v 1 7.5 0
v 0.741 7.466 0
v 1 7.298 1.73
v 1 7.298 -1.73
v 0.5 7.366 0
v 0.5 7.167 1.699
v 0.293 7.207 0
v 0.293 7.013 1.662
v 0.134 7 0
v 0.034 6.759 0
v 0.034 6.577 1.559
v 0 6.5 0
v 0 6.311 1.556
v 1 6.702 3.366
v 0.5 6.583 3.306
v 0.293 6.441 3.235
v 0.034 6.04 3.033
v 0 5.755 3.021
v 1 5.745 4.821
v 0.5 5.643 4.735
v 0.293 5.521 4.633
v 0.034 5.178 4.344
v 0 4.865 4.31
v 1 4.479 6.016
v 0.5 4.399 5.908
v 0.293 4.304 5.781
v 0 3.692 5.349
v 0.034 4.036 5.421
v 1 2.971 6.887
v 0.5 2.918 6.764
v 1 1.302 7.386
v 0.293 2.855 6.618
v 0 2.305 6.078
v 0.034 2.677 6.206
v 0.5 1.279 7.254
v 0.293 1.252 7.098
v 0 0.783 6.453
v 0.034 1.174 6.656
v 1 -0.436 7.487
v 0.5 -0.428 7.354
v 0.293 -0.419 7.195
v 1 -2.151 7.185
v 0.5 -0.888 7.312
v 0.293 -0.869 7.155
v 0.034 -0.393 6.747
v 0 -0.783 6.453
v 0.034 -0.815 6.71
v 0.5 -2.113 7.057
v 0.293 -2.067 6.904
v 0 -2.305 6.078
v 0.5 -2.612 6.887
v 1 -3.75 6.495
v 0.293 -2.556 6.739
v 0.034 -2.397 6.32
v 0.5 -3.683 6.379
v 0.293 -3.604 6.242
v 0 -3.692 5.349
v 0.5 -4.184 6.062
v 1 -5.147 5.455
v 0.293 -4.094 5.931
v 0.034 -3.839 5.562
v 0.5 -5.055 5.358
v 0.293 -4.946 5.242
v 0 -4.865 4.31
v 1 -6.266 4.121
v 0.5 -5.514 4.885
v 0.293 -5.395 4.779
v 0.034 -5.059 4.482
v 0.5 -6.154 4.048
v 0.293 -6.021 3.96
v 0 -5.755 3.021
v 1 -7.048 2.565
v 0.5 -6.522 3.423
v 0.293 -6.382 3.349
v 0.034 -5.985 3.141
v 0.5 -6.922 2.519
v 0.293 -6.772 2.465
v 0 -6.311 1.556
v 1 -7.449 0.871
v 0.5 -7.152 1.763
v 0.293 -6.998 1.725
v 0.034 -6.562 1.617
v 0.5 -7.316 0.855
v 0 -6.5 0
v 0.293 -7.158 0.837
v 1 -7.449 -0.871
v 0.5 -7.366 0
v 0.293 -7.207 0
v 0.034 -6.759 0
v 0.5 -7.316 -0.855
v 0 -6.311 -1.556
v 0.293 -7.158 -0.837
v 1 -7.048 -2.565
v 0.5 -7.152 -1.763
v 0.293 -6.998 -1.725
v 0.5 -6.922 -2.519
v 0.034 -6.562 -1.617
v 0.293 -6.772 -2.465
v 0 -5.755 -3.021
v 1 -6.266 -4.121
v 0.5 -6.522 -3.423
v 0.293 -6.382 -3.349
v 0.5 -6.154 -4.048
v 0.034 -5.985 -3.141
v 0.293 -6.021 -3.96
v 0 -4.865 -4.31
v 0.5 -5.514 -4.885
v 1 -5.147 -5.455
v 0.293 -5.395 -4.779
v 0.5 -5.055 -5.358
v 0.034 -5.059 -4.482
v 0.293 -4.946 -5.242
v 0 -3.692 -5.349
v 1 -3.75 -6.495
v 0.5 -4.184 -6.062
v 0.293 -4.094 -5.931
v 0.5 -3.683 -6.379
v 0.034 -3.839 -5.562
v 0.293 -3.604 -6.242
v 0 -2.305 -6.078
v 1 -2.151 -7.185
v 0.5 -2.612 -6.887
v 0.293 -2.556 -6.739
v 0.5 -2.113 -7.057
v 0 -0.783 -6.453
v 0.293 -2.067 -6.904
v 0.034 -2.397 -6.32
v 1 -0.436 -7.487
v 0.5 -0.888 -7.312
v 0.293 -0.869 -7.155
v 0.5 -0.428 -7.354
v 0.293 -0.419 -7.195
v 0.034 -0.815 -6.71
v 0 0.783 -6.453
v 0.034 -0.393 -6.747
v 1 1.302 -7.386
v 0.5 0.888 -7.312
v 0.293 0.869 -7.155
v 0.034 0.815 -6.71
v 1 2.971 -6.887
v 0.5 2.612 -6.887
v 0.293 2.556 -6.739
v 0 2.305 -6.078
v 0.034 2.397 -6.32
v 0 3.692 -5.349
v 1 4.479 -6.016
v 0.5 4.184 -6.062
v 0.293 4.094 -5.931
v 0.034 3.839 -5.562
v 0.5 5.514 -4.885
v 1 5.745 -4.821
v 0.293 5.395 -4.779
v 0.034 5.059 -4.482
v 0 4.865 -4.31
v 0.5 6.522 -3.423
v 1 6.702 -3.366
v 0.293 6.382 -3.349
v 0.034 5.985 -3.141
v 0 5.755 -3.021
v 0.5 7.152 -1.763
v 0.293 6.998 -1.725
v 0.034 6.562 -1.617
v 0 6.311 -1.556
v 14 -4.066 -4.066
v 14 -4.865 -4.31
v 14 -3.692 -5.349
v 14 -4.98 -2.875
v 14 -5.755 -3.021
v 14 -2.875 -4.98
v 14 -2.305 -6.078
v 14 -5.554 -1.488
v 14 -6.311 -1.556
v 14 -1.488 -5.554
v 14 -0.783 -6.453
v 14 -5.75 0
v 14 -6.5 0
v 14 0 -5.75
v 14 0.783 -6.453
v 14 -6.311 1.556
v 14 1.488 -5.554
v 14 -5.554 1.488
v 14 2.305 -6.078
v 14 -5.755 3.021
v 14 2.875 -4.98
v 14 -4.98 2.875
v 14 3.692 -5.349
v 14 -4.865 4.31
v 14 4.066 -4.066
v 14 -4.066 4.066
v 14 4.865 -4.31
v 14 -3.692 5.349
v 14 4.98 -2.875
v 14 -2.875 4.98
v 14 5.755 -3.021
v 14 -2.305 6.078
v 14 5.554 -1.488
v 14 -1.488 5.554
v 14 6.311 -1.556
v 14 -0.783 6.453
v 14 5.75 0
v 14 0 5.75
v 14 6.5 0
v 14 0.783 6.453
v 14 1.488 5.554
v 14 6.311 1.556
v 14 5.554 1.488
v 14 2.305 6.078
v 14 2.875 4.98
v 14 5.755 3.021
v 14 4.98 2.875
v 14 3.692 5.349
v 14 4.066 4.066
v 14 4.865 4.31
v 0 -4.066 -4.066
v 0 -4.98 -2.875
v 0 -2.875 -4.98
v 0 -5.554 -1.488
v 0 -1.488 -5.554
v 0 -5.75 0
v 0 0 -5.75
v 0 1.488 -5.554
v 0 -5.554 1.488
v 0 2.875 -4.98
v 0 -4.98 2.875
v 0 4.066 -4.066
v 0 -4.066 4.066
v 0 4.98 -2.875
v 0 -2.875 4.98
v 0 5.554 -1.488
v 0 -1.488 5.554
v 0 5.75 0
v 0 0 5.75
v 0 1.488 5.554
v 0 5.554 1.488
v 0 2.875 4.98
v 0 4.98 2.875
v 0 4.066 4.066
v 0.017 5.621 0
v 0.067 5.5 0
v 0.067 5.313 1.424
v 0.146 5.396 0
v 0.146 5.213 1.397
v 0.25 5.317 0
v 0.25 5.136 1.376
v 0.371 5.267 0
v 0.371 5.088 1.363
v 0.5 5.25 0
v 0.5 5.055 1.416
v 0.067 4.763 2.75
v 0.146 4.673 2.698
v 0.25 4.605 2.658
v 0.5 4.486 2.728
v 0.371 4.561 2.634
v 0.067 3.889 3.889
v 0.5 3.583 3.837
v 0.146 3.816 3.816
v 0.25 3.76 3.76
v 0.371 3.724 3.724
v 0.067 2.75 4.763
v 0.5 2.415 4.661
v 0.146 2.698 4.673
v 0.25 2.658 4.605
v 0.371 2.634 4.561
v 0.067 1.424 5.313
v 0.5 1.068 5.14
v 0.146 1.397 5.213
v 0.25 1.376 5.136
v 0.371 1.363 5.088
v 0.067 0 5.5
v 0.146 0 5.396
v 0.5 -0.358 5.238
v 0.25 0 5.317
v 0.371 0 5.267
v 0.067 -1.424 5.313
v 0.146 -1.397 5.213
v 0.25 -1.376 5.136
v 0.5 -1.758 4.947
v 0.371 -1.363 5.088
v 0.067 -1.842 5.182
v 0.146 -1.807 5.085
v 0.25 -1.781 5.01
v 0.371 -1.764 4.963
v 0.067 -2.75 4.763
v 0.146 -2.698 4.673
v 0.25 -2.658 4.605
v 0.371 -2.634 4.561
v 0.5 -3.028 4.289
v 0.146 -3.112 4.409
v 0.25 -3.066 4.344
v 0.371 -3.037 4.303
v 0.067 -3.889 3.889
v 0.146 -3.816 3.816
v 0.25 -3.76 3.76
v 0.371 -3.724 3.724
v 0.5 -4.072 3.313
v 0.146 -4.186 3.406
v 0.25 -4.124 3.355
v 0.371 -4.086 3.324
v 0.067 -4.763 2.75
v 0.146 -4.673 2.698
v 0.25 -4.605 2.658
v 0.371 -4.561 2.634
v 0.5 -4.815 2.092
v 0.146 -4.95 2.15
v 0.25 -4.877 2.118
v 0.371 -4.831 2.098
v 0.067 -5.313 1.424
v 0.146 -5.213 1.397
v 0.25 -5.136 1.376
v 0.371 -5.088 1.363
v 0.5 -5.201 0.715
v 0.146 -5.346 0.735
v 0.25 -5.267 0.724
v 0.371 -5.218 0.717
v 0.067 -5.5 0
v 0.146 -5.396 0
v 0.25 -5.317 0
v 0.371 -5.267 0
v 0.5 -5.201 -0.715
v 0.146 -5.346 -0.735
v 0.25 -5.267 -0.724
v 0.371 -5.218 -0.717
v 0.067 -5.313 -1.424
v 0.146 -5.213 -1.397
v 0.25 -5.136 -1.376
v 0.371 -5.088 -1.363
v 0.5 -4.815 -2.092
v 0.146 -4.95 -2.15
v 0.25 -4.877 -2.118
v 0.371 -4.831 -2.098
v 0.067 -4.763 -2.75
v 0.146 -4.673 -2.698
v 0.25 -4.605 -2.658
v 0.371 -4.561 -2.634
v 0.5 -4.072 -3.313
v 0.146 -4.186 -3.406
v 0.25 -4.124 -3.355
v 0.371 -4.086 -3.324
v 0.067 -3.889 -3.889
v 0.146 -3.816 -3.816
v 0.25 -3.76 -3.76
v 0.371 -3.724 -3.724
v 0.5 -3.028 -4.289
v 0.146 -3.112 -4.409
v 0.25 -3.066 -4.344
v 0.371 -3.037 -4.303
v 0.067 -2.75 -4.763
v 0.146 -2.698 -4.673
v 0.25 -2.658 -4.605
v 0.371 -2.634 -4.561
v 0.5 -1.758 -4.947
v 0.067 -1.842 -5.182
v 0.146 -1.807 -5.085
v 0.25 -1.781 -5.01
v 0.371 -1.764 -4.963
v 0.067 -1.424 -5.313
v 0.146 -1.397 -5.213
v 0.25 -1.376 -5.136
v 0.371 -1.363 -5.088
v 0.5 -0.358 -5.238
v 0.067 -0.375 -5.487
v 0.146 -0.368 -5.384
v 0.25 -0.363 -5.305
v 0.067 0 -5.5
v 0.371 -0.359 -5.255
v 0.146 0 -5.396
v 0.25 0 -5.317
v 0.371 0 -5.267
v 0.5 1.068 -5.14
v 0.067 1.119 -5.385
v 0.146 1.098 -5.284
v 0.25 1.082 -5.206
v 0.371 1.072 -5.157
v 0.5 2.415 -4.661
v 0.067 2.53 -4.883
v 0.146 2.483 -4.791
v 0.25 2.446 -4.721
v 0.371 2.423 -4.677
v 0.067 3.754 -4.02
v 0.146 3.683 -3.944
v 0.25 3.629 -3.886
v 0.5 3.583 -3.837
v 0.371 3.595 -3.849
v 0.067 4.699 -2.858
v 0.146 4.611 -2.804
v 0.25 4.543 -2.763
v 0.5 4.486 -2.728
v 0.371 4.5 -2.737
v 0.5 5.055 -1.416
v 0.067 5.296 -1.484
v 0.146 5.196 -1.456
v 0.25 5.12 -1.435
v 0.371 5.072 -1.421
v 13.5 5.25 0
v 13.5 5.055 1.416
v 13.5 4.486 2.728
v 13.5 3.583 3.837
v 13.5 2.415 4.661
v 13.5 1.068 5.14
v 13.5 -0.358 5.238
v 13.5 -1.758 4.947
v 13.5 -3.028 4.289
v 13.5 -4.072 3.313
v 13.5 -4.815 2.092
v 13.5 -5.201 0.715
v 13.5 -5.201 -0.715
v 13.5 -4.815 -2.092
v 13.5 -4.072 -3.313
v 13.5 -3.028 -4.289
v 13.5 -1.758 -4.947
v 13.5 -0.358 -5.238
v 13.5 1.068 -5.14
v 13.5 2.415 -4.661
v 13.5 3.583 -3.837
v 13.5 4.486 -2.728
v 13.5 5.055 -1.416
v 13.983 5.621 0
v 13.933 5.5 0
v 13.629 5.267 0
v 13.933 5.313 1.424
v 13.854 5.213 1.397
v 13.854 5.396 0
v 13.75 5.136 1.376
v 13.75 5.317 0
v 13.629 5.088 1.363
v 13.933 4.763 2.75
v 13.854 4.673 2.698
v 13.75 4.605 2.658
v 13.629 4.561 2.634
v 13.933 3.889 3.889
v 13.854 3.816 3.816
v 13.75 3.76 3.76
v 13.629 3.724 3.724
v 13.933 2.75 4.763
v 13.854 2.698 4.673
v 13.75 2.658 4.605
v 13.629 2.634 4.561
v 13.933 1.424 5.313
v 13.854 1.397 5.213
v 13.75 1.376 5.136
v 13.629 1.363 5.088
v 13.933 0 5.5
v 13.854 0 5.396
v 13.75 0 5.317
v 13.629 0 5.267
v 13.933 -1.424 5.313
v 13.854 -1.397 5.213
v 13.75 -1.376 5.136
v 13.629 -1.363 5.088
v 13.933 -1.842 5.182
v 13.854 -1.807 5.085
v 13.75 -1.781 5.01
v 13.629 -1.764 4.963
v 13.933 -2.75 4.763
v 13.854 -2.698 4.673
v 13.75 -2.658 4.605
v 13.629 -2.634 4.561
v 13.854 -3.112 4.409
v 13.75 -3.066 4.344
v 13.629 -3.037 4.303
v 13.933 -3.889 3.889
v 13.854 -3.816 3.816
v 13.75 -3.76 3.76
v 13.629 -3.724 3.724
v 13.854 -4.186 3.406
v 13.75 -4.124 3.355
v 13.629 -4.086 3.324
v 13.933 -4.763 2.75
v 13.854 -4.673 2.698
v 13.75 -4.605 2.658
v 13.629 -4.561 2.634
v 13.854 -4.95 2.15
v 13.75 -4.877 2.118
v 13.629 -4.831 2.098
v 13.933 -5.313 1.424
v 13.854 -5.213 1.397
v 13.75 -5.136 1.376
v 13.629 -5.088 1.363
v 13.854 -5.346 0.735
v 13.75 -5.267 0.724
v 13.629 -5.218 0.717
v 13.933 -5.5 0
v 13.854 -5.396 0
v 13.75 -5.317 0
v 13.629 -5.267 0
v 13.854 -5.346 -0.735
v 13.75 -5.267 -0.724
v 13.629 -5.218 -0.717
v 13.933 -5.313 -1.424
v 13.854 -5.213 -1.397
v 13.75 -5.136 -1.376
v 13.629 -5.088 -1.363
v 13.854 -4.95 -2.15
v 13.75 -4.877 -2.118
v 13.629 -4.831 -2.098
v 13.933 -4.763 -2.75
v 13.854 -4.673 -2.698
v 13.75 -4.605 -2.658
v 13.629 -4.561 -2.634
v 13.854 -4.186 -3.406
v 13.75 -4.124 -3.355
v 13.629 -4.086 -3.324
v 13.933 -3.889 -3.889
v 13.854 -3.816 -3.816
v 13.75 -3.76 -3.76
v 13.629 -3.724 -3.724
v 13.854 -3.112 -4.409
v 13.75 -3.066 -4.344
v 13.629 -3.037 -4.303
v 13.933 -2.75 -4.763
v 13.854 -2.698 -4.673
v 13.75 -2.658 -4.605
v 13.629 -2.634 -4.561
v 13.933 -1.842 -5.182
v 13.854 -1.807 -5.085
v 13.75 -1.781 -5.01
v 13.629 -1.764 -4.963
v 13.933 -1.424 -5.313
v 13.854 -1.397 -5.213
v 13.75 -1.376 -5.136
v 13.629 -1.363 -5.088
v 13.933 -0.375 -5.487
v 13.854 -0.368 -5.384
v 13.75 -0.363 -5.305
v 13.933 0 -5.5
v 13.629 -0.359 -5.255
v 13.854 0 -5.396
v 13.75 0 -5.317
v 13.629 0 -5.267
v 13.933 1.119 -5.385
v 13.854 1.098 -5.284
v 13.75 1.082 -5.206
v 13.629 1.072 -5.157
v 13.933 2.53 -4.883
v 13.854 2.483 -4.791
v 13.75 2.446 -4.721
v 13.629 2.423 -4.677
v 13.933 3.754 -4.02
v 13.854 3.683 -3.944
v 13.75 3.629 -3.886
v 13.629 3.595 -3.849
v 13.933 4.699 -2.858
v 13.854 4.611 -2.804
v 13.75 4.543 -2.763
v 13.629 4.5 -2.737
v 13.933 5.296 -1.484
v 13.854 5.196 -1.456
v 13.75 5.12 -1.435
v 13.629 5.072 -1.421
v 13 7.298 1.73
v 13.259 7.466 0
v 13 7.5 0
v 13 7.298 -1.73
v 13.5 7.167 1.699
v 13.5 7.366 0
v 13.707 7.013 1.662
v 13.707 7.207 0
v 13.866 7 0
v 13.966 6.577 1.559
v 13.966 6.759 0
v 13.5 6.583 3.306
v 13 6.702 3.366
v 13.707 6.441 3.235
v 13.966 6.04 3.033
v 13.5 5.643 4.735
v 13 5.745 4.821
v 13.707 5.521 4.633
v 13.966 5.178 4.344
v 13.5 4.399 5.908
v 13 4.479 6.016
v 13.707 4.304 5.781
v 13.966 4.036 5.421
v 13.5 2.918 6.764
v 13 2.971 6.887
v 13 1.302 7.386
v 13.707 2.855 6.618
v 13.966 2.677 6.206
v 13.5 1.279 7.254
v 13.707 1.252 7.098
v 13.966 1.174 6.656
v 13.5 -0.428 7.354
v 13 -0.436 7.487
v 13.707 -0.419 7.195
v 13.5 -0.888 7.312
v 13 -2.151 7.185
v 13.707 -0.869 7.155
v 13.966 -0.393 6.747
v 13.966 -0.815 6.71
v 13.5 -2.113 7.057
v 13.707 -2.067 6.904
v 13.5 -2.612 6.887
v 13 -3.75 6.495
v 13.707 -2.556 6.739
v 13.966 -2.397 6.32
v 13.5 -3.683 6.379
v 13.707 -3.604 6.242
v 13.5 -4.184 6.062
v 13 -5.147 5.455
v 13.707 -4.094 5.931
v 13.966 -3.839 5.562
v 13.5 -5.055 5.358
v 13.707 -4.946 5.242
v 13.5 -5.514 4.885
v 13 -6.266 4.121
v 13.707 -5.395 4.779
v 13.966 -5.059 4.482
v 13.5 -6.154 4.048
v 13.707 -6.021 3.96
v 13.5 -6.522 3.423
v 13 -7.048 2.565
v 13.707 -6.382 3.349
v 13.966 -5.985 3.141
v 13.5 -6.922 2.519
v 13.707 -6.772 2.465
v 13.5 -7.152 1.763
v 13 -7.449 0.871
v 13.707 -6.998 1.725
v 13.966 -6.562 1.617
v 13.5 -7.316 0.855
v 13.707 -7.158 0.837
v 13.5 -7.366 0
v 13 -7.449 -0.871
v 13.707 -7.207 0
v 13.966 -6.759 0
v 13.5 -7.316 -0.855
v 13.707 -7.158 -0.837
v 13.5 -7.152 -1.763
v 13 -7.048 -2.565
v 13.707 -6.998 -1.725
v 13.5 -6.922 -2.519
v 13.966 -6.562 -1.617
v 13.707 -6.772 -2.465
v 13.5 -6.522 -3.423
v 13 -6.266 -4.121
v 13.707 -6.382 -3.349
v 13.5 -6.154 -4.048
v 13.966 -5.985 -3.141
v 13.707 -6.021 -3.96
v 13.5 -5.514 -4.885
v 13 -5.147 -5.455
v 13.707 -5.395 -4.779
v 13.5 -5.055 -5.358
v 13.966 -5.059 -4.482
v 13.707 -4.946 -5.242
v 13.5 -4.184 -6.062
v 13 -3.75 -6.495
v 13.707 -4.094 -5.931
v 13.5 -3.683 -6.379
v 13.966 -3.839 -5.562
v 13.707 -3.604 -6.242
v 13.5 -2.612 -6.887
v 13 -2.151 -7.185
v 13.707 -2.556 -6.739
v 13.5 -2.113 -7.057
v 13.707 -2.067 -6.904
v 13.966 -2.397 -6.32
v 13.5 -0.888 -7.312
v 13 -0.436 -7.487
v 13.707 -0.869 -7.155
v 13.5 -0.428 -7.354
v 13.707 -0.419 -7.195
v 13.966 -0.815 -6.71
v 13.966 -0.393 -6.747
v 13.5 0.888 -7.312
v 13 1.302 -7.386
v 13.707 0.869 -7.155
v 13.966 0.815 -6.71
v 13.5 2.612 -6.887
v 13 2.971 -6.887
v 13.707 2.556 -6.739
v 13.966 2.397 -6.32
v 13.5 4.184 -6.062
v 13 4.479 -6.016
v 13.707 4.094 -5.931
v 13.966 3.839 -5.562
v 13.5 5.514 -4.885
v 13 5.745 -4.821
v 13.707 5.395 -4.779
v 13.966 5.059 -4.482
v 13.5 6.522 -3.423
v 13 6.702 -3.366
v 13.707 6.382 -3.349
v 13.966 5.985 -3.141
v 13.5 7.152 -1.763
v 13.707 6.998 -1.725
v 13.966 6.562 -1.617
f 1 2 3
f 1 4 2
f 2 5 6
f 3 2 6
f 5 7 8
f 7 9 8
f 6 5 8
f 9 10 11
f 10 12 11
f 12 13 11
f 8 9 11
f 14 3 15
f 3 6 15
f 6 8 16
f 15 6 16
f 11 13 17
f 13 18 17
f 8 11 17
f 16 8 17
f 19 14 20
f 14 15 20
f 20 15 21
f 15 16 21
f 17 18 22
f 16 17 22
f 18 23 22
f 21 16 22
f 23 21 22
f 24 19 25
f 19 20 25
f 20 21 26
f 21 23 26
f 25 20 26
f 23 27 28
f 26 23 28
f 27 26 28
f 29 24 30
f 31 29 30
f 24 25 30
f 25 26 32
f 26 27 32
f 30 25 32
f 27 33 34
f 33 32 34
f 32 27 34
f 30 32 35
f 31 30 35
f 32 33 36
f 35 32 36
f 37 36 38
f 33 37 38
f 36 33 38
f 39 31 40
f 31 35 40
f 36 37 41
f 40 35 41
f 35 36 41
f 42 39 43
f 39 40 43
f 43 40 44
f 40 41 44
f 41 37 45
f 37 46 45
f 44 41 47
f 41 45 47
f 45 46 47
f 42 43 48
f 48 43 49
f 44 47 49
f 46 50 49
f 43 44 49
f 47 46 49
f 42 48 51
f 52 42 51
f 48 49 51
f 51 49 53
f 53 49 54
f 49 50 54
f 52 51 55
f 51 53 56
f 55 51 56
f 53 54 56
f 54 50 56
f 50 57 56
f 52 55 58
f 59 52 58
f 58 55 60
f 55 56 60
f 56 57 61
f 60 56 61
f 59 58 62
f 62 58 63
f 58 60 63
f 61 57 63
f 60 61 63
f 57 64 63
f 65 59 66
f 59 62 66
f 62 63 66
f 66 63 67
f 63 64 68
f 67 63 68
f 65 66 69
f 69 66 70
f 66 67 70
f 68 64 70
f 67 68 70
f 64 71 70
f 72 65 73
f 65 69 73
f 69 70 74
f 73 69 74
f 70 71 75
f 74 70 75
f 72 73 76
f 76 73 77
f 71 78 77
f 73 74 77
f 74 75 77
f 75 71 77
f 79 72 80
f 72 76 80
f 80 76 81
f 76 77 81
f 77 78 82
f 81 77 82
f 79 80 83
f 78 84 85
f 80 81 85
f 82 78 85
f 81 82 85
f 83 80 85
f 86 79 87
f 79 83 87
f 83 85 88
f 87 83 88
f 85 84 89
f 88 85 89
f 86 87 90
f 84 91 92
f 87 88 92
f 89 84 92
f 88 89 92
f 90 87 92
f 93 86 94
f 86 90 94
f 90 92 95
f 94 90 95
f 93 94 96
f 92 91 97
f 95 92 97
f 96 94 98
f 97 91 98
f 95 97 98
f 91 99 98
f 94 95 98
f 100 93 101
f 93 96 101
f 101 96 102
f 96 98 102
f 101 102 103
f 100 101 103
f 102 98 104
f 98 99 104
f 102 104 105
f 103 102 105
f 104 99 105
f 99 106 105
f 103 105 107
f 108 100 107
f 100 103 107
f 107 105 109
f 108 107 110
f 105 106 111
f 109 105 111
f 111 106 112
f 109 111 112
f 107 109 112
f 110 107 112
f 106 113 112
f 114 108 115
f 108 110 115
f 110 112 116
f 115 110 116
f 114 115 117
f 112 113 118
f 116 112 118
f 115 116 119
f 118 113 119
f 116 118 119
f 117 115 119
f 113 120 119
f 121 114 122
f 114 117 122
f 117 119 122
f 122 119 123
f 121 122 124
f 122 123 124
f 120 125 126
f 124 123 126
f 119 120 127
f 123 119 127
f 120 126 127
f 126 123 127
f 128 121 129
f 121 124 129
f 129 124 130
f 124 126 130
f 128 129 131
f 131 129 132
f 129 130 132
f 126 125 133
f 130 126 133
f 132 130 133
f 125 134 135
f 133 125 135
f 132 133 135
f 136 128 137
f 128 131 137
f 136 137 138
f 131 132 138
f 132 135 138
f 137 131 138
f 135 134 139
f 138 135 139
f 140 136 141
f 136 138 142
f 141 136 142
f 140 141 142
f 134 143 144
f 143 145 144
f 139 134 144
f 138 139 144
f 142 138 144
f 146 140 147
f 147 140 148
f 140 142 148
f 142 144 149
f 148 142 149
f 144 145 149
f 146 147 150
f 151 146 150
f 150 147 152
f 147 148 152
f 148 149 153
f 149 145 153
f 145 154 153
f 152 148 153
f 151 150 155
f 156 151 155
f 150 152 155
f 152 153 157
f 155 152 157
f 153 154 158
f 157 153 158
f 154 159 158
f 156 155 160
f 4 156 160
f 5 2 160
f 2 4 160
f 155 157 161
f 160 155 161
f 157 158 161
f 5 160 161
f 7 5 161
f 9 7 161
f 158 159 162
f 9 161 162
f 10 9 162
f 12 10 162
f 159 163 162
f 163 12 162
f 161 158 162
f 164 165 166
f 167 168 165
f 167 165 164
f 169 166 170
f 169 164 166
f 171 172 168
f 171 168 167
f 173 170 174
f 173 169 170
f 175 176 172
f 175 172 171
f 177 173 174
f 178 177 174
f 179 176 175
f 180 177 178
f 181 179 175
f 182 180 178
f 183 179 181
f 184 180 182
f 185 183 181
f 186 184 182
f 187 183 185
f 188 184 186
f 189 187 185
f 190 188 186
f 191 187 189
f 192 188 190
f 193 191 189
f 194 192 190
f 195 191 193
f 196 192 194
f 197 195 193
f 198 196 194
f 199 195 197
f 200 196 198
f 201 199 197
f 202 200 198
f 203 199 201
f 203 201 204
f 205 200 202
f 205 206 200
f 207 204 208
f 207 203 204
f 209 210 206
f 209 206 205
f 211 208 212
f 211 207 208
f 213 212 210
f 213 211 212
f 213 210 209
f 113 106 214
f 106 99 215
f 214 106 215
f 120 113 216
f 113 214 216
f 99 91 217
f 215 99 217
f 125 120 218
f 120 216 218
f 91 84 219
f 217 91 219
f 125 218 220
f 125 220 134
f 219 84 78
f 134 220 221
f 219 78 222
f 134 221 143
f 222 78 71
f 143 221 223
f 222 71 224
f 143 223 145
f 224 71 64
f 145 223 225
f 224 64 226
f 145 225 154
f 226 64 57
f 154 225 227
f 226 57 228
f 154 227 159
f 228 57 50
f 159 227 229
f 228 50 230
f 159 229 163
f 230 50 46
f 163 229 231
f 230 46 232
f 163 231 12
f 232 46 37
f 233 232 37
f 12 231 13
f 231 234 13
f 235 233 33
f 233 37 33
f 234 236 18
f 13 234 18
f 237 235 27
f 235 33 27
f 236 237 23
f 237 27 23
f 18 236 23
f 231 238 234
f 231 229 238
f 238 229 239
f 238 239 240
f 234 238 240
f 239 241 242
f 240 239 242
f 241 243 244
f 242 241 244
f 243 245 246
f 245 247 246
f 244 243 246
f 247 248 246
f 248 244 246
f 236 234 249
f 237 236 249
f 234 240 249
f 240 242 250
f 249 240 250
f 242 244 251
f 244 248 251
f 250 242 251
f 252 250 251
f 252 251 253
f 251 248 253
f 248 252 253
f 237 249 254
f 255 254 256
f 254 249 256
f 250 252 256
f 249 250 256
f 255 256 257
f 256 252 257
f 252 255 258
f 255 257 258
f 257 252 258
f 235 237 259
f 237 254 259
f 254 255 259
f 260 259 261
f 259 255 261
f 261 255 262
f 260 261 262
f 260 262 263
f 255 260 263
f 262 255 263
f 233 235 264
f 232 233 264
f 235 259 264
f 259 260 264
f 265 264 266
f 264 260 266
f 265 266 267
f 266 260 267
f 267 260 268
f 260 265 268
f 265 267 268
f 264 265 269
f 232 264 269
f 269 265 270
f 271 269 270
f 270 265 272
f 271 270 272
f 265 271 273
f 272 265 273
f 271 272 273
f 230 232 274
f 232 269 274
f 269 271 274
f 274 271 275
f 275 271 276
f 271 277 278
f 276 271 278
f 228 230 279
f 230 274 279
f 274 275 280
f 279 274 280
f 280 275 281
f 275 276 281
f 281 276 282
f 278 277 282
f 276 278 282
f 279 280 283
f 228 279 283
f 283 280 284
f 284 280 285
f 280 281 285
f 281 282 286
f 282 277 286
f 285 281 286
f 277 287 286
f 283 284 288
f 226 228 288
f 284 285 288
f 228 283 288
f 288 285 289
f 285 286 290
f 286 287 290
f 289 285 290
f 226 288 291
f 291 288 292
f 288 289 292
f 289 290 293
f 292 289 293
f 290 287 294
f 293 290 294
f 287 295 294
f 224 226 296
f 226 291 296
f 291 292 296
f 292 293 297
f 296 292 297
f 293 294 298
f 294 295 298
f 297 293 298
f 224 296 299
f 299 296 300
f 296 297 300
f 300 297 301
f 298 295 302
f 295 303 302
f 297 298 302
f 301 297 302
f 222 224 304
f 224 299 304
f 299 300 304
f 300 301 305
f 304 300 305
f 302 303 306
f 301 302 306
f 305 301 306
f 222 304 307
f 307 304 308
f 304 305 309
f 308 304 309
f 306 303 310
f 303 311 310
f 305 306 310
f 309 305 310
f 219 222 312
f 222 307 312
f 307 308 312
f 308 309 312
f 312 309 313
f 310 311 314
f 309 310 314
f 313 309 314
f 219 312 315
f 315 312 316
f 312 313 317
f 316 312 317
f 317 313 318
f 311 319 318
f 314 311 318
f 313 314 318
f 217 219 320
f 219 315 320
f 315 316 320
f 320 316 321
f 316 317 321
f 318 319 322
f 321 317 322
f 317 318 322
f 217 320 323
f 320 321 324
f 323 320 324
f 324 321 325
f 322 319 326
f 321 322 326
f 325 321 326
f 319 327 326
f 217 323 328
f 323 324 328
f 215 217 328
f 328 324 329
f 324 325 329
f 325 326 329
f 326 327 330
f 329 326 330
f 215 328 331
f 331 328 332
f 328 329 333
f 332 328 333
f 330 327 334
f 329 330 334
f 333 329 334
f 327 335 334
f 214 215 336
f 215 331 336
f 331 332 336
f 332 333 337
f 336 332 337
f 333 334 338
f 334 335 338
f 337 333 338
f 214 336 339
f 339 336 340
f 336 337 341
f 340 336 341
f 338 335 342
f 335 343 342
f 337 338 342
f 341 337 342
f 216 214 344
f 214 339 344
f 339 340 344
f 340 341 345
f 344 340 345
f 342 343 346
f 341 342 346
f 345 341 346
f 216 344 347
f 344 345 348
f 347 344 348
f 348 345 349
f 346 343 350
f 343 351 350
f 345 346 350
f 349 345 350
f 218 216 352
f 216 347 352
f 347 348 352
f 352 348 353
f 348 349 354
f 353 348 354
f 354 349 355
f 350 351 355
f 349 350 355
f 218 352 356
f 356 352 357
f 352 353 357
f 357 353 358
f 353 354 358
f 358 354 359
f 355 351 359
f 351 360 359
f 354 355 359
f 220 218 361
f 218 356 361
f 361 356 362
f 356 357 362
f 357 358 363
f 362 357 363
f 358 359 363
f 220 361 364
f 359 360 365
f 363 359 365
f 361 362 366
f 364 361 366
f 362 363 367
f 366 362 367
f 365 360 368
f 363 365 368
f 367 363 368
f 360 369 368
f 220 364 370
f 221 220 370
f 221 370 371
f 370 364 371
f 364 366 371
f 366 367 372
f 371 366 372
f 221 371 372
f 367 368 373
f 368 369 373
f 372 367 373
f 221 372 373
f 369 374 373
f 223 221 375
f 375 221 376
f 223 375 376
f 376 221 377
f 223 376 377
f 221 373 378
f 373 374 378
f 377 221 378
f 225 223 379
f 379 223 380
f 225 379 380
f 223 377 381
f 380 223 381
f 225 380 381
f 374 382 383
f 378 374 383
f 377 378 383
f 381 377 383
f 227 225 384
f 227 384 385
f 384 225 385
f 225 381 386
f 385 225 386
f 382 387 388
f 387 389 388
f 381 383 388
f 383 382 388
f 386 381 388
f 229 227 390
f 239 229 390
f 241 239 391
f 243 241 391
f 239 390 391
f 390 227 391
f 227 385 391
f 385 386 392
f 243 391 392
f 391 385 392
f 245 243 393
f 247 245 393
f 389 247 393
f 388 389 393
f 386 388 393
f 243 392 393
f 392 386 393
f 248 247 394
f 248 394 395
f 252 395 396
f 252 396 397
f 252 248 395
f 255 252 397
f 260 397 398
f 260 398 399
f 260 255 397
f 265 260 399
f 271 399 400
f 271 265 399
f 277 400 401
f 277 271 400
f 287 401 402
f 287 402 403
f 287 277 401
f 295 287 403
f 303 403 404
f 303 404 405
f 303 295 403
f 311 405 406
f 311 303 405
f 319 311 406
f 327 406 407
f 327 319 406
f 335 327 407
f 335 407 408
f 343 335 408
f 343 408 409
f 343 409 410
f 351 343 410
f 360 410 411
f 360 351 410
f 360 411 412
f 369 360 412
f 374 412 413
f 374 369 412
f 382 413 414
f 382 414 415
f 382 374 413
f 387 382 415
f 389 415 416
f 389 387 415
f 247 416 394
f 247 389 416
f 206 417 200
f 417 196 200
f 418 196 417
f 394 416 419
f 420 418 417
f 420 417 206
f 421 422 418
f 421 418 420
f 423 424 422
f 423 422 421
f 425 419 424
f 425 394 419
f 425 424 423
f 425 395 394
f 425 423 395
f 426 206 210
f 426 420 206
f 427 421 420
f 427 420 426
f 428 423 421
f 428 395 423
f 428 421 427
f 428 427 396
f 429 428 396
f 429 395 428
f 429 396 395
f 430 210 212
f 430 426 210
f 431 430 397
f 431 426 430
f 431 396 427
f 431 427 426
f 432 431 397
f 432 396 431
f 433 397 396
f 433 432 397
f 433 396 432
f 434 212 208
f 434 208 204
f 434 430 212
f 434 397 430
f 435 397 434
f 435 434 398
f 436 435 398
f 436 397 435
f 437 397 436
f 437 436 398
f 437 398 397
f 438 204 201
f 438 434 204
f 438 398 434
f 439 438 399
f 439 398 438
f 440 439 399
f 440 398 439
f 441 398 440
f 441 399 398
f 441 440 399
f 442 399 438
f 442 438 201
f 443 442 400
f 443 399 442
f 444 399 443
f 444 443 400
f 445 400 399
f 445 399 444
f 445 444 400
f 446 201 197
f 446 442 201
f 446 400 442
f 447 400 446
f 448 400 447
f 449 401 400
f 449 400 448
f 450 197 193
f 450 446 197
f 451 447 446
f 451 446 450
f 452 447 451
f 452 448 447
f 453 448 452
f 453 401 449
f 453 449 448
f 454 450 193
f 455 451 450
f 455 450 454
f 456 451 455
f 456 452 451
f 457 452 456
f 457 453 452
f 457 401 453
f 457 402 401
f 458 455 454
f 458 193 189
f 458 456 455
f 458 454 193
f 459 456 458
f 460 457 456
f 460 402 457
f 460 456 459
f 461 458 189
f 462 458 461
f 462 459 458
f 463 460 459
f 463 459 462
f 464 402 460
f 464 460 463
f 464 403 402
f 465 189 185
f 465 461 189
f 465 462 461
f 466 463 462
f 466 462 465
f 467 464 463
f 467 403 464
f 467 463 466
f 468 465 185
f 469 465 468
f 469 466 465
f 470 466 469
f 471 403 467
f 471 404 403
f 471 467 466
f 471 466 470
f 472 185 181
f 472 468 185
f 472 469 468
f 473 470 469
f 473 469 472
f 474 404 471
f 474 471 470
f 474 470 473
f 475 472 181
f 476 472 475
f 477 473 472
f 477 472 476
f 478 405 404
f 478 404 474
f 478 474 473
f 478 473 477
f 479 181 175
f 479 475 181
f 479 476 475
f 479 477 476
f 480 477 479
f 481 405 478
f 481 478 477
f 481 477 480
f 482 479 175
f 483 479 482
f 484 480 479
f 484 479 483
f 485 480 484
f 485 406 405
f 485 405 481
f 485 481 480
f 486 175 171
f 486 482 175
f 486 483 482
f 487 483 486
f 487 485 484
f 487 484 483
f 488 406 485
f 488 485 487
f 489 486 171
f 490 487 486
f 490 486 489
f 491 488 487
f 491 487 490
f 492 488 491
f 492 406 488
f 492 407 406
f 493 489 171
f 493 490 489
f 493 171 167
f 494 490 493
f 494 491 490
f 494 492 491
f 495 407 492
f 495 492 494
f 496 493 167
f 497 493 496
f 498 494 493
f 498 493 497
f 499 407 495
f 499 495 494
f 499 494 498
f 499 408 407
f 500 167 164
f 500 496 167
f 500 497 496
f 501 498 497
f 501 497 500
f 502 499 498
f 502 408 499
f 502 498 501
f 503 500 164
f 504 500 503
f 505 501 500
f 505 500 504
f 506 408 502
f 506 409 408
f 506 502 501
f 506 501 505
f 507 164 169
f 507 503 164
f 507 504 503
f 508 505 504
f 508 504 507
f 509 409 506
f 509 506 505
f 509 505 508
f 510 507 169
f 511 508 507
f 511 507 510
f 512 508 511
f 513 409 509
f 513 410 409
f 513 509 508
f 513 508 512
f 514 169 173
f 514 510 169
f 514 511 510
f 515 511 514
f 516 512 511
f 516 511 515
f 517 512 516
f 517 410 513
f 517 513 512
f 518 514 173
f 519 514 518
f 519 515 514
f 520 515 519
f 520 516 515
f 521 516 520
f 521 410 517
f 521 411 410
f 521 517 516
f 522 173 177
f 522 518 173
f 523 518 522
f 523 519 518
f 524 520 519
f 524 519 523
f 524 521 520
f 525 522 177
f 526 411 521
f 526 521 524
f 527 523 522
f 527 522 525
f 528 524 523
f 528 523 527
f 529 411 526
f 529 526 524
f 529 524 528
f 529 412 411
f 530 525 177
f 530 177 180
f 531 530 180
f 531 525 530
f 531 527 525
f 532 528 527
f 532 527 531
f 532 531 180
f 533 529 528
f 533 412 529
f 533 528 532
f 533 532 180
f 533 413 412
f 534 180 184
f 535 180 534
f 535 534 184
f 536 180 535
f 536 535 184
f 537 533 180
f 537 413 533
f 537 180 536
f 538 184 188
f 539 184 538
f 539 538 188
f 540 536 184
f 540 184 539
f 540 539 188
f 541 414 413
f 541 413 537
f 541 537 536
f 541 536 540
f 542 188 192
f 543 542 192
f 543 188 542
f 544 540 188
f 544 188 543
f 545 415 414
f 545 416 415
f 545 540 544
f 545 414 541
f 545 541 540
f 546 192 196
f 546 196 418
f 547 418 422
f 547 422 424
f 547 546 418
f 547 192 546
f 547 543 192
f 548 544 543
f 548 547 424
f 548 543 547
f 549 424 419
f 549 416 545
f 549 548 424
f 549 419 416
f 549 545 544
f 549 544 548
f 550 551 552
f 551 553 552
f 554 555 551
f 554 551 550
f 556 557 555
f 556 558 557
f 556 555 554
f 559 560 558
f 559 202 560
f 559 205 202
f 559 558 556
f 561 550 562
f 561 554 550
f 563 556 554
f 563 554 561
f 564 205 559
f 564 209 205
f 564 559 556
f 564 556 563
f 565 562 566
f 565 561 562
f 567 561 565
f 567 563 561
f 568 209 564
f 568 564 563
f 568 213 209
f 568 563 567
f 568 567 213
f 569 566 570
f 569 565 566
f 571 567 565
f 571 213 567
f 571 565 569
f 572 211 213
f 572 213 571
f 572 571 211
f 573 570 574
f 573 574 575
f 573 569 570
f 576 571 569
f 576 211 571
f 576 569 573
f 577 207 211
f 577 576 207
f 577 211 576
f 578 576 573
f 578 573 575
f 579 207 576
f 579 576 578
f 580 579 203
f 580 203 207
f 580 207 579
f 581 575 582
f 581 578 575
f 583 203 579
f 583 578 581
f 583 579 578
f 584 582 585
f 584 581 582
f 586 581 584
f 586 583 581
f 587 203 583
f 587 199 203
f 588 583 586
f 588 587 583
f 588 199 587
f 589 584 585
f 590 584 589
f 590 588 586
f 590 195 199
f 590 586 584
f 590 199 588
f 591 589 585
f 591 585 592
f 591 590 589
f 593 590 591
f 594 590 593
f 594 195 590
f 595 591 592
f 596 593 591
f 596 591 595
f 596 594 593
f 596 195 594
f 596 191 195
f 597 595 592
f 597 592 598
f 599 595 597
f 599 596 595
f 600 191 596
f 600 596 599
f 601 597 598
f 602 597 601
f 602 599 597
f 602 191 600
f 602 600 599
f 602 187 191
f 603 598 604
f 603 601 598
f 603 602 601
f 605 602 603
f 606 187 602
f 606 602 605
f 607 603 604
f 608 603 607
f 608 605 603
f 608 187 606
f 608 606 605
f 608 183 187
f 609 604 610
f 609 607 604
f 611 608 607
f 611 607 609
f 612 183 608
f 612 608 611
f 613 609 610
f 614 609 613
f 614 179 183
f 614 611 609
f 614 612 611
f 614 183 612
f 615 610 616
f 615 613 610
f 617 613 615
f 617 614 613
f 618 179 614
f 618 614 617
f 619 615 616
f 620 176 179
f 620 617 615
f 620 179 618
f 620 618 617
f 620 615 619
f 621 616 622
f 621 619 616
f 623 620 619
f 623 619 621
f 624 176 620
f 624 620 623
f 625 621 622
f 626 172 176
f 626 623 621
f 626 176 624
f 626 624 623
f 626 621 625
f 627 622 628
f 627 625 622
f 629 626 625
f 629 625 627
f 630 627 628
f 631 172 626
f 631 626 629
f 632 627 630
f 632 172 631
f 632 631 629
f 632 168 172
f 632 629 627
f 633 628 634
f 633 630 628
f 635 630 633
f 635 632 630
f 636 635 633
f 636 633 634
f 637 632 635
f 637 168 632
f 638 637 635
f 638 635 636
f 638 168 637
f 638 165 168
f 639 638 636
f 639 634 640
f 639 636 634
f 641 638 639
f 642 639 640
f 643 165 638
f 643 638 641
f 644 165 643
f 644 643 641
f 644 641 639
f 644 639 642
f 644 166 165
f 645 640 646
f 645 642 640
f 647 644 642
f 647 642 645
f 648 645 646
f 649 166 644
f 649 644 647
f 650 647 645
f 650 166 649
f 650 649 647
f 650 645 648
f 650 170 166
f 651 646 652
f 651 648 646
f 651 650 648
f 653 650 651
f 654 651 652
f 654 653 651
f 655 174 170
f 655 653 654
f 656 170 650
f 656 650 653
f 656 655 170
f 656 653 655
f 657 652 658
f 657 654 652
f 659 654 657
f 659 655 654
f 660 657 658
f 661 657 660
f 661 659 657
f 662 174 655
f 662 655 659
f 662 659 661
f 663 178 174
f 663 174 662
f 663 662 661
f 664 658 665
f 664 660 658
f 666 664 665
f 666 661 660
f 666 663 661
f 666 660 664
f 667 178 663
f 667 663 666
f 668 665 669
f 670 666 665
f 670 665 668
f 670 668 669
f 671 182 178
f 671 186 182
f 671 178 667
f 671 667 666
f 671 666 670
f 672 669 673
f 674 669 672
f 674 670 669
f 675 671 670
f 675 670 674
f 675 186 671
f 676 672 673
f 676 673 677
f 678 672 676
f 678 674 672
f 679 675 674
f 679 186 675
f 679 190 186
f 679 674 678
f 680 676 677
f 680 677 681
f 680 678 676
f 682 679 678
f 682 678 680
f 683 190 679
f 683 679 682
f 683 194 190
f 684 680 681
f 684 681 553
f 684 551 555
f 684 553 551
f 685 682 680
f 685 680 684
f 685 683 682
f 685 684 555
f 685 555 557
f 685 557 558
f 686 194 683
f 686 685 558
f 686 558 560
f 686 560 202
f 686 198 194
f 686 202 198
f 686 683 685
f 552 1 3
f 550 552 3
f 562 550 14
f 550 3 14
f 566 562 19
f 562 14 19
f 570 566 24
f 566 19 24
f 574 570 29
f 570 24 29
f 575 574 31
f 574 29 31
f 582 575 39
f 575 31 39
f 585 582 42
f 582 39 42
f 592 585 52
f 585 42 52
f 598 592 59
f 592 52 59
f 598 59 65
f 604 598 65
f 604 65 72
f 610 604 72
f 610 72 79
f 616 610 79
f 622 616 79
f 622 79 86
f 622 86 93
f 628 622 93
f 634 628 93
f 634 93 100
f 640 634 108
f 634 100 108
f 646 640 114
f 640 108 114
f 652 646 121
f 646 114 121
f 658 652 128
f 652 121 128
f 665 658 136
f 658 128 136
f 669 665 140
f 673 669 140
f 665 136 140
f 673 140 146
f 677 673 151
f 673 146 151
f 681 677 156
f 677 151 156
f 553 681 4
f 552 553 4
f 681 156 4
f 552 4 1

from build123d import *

# Parameters (mm, degrees)
F0_R     = 7.5
F0_R_2   = 5.25
F1_DEPTH = 14
F2_R     = 1
F3_R     = 0.5


with BuildPart() as f1:
    # F0 (on Right) → F1 (new body)
    with BuildSketch(Plane.YZ):
        Circle(F0_R)
        Circle(F0_R_2, mode=Mode.SUBTRACT)
    extrude(amount=F1_DEPTH)

    # F2
    f2_edges = [f1.edges().sort_by_distance(p)[0] for p in [
        (0, -7.5, 0),
        (14, -7.5, 0),
    ]]
    fillet(f2_edges, radius=F2_R)

    # F3
    f3_edges = [f1.edges().sort_by_distance(p)[0] for p in [
        (14, -5.25, 0),
        (7, 5.25, 0),
        (0, -5.25, 0),
    ]]
    fillet(f3_edges, radius=F3_R)


solid = f1.part
